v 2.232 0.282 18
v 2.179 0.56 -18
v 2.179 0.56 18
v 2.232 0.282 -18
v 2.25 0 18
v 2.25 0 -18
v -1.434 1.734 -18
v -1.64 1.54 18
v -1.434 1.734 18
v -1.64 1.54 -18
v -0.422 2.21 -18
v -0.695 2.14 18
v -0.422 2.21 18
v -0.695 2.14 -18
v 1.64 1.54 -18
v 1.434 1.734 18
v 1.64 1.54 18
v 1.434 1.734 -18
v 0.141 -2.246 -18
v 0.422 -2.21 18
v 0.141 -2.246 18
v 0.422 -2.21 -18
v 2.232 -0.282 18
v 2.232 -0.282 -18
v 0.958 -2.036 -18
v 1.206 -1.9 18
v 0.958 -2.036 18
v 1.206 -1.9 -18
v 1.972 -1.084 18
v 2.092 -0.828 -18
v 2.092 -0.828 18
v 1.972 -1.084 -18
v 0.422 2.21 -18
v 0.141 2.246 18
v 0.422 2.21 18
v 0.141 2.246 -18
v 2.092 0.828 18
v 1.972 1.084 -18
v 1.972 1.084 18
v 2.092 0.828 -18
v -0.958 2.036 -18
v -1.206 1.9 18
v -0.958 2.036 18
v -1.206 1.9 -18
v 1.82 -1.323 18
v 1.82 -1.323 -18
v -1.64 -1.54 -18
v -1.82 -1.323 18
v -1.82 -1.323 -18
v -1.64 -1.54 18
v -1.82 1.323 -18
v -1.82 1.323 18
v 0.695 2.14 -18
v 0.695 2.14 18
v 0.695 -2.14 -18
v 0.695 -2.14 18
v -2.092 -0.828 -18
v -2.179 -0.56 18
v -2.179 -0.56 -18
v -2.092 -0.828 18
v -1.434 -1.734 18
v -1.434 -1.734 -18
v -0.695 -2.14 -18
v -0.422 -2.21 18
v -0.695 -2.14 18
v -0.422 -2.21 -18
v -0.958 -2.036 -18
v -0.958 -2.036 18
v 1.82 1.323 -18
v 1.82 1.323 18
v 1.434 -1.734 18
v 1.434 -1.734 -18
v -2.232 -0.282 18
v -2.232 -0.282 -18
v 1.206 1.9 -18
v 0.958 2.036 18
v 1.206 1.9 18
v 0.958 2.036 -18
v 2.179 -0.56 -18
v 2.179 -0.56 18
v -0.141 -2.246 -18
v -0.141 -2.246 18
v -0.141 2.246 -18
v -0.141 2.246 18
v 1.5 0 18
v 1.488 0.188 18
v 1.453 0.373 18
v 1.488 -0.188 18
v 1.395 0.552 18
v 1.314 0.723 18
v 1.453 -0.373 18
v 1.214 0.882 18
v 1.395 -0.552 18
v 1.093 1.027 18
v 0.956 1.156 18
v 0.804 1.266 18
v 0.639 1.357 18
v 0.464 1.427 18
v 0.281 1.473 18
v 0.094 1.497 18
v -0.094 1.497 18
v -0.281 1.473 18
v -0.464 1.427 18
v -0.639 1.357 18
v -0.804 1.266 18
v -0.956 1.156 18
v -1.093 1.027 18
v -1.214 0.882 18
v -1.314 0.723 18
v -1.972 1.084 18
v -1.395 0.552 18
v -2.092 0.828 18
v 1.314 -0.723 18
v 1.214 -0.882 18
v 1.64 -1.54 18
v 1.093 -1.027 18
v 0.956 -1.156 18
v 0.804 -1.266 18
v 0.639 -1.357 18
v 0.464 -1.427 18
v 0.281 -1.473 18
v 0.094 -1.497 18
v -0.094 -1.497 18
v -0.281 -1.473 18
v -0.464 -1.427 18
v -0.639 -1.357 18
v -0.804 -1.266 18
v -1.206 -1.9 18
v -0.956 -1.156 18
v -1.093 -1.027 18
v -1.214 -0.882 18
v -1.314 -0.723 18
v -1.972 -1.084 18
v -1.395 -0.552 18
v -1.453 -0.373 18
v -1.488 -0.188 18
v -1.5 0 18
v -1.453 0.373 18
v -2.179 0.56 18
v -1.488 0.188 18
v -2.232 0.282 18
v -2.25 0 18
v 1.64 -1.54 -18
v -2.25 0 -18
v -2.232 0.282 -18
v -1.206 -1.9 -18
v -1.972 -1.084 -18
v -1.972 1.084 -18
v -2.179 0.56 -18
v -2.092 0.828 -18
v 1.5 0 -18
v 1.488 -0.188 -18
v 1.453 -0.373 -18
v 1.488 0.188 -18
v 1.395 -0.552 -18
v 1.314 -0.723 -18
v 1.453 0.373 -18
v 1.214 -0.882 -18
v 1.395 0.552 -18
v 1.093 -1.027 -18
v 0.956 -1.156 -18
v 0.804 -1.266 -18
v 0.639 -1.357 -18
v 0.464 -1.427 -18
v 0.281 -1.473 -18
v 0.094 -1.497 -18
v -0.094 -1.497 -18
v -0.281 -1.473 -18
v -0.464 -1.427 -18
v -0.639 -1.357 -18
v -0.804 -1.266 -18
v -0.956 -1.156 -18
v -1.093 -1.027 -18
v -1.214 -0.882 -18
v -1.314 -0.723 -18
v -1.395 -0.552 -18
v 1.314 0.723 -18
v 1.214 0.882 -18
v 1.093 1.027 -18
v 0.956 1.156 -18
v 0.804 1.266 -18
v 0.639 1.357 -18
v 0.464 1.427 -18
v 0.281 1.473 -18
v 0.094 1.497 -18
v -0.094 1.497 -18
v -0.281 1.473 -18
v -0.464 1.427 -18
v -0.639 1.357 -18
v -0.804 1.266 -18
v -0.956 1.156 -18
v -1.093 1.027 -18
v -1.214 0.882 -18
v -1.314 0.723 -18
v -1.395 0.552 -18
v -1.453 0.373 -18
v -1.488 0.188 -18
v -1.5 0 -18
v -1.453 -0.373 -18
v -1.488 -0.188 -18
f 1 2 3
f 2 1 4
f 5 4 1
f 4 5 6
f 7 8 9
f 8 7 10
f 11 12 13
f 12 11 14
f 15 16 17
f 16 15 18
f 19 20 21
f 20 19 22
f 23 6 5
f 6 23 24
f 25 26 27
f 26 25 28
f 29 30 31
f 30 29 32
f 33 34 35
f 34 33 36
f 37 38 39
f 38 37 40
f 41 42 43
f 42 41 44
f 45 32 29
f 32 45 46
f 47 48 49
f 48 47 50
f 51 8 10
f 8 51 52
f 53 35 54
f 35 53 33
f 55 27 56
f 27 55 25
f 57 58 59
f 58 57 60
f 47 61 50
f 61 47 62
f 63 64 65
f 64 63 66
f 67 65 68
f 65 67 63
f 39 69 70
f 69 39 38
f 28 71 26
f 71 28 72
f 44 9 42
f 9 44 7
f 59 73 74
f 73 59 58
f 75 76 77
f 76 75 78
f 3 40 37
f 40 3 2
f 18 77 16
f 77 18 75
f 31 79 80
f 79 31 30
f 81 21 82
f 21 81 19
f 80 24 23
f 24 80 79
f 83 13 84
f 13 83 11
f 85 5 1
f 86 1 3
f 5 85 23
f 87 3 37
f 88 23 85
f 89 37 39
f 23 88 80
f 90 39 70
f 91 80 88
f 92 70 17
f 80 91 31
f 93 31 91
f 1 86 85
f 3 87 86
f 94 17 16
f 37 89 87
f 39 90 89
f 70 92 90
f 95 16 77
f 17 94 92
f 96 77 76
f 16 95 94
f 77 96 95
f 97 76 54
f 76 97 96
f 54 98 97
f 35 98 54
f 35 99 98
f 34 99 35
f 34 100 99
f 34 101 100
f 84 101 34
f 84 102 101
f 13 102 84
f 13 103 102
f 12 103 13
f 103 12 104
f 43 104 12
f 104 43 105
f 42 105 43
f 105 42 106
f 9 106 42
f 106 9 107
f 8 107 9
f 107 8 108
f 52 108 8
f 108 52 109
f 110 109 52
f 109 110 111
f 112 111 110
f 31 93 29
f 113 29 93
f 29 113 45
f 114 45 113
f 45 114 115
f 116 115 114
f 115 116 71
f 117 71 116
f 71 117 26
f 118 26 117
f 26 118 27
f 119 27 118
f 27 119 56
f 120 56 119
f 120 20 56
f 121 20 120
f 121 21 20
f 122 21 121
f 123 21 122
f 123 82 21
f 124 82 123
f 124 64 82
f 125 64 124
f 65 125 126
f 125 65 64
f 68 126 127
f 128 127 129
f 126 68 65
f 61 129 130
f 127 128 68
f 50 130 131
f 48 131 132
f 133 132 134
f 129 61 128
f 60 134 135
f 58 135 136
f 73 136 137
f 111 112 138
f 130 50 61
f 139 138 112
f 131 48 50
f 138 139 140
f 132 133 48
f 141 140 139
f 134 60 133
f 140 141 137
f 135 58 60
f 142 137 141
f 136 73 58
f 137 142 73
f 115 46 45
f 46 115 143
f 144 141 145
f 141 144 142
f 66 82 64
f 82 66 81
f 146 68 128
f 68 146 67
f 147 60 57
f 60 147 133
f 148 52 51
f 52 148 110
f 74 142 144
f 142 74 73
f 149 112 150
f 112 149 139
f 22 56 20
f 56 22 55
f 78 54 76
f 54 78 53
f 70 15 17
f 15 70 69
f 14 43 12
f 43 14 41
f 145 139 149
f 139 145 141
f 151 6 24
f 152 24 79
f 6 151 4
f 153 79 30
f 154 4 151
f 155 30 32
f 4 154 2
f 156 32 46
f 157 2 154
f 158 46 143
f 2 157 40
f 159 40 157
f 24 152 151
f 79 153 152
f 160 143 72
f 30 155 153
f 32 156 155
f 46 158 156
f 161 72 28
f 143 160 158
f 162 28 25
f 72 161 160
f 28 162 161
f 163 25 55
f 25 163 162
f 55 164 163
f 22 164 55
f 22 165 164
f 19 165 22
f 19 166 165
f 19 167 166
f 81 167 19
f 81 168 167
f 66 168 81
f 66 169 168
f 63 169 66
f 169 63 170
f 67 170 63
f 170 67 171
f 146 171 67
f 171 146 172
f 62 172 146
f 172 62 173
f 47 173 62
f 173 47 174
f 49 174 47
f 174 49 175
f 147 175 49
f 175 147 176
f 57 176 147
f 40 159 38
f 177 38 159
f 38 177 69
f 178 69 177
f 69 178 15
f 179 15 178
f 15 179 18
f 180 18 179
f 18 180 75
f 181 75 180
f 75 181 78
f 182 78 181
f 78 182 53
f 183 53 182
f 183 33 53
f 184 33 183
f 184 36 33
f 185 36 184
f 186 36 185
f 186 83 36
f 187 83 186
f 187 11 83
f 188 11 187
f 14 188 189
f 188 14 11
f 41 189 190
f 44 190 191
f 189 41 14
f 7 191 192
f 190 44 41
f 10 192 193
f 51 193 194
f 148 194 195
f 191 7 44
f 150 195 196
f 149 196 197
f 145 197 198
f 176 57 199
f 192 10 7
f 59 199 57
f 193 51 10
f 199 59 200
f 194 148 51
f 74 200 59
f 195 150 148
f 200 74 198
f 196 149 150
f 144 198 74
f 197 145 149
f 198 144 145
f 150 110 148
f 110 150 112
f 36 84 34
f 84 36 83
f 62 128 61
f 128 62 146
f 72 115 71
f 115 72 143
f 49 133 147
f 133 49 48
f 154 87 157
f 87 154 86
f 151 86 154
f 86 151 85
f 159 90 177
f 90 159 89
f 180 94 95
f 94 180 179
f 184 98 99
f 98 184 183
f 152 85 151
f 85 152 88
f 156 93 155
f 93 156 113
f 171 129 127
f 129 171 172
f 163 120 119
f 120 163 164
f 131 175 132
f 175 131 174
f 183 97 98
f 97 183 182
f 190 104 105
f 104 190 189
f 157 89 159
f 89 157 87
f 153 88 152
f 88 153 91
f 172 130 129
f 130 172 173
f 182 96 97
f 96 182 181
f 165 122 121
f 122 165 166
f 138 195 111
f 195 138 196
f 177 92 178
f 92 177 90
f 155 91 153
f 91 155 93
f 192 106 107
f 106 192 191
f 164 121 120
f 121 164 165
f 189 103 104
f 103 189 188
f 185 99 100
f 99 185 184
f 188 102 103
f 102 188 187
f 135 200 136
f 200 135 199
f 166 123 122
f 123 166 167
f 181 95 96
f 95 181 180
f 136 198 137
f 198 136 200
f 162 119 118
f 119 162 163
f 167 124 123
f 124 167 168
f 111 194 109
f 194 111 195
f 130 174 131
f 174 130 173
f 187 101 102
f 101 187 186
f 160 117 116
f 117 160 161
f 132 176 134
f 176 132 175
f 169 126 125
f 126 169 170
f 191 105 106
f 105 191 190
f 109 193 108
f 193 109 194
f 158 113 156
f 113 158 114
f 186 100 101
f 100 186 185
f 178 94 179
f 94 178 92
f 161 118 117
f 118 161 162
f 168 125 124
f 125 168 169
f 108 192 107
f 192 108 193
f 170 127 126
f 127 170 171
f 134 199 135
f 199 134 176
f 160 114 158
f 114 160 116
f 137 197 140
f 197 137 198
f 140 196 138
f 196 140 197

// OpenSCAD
$fn = 50;


difference() {
	union() {
		translate(v = [0, 0, -18.0000000000]) {
			cylinder(h = 36, r = 2.2500000000);
		}
	}
	union() {
		translate(v = [0, 0, -100.0000000000]) {
			cylinder(h = 200, r = 1.5000000000);
		}
	}
}
